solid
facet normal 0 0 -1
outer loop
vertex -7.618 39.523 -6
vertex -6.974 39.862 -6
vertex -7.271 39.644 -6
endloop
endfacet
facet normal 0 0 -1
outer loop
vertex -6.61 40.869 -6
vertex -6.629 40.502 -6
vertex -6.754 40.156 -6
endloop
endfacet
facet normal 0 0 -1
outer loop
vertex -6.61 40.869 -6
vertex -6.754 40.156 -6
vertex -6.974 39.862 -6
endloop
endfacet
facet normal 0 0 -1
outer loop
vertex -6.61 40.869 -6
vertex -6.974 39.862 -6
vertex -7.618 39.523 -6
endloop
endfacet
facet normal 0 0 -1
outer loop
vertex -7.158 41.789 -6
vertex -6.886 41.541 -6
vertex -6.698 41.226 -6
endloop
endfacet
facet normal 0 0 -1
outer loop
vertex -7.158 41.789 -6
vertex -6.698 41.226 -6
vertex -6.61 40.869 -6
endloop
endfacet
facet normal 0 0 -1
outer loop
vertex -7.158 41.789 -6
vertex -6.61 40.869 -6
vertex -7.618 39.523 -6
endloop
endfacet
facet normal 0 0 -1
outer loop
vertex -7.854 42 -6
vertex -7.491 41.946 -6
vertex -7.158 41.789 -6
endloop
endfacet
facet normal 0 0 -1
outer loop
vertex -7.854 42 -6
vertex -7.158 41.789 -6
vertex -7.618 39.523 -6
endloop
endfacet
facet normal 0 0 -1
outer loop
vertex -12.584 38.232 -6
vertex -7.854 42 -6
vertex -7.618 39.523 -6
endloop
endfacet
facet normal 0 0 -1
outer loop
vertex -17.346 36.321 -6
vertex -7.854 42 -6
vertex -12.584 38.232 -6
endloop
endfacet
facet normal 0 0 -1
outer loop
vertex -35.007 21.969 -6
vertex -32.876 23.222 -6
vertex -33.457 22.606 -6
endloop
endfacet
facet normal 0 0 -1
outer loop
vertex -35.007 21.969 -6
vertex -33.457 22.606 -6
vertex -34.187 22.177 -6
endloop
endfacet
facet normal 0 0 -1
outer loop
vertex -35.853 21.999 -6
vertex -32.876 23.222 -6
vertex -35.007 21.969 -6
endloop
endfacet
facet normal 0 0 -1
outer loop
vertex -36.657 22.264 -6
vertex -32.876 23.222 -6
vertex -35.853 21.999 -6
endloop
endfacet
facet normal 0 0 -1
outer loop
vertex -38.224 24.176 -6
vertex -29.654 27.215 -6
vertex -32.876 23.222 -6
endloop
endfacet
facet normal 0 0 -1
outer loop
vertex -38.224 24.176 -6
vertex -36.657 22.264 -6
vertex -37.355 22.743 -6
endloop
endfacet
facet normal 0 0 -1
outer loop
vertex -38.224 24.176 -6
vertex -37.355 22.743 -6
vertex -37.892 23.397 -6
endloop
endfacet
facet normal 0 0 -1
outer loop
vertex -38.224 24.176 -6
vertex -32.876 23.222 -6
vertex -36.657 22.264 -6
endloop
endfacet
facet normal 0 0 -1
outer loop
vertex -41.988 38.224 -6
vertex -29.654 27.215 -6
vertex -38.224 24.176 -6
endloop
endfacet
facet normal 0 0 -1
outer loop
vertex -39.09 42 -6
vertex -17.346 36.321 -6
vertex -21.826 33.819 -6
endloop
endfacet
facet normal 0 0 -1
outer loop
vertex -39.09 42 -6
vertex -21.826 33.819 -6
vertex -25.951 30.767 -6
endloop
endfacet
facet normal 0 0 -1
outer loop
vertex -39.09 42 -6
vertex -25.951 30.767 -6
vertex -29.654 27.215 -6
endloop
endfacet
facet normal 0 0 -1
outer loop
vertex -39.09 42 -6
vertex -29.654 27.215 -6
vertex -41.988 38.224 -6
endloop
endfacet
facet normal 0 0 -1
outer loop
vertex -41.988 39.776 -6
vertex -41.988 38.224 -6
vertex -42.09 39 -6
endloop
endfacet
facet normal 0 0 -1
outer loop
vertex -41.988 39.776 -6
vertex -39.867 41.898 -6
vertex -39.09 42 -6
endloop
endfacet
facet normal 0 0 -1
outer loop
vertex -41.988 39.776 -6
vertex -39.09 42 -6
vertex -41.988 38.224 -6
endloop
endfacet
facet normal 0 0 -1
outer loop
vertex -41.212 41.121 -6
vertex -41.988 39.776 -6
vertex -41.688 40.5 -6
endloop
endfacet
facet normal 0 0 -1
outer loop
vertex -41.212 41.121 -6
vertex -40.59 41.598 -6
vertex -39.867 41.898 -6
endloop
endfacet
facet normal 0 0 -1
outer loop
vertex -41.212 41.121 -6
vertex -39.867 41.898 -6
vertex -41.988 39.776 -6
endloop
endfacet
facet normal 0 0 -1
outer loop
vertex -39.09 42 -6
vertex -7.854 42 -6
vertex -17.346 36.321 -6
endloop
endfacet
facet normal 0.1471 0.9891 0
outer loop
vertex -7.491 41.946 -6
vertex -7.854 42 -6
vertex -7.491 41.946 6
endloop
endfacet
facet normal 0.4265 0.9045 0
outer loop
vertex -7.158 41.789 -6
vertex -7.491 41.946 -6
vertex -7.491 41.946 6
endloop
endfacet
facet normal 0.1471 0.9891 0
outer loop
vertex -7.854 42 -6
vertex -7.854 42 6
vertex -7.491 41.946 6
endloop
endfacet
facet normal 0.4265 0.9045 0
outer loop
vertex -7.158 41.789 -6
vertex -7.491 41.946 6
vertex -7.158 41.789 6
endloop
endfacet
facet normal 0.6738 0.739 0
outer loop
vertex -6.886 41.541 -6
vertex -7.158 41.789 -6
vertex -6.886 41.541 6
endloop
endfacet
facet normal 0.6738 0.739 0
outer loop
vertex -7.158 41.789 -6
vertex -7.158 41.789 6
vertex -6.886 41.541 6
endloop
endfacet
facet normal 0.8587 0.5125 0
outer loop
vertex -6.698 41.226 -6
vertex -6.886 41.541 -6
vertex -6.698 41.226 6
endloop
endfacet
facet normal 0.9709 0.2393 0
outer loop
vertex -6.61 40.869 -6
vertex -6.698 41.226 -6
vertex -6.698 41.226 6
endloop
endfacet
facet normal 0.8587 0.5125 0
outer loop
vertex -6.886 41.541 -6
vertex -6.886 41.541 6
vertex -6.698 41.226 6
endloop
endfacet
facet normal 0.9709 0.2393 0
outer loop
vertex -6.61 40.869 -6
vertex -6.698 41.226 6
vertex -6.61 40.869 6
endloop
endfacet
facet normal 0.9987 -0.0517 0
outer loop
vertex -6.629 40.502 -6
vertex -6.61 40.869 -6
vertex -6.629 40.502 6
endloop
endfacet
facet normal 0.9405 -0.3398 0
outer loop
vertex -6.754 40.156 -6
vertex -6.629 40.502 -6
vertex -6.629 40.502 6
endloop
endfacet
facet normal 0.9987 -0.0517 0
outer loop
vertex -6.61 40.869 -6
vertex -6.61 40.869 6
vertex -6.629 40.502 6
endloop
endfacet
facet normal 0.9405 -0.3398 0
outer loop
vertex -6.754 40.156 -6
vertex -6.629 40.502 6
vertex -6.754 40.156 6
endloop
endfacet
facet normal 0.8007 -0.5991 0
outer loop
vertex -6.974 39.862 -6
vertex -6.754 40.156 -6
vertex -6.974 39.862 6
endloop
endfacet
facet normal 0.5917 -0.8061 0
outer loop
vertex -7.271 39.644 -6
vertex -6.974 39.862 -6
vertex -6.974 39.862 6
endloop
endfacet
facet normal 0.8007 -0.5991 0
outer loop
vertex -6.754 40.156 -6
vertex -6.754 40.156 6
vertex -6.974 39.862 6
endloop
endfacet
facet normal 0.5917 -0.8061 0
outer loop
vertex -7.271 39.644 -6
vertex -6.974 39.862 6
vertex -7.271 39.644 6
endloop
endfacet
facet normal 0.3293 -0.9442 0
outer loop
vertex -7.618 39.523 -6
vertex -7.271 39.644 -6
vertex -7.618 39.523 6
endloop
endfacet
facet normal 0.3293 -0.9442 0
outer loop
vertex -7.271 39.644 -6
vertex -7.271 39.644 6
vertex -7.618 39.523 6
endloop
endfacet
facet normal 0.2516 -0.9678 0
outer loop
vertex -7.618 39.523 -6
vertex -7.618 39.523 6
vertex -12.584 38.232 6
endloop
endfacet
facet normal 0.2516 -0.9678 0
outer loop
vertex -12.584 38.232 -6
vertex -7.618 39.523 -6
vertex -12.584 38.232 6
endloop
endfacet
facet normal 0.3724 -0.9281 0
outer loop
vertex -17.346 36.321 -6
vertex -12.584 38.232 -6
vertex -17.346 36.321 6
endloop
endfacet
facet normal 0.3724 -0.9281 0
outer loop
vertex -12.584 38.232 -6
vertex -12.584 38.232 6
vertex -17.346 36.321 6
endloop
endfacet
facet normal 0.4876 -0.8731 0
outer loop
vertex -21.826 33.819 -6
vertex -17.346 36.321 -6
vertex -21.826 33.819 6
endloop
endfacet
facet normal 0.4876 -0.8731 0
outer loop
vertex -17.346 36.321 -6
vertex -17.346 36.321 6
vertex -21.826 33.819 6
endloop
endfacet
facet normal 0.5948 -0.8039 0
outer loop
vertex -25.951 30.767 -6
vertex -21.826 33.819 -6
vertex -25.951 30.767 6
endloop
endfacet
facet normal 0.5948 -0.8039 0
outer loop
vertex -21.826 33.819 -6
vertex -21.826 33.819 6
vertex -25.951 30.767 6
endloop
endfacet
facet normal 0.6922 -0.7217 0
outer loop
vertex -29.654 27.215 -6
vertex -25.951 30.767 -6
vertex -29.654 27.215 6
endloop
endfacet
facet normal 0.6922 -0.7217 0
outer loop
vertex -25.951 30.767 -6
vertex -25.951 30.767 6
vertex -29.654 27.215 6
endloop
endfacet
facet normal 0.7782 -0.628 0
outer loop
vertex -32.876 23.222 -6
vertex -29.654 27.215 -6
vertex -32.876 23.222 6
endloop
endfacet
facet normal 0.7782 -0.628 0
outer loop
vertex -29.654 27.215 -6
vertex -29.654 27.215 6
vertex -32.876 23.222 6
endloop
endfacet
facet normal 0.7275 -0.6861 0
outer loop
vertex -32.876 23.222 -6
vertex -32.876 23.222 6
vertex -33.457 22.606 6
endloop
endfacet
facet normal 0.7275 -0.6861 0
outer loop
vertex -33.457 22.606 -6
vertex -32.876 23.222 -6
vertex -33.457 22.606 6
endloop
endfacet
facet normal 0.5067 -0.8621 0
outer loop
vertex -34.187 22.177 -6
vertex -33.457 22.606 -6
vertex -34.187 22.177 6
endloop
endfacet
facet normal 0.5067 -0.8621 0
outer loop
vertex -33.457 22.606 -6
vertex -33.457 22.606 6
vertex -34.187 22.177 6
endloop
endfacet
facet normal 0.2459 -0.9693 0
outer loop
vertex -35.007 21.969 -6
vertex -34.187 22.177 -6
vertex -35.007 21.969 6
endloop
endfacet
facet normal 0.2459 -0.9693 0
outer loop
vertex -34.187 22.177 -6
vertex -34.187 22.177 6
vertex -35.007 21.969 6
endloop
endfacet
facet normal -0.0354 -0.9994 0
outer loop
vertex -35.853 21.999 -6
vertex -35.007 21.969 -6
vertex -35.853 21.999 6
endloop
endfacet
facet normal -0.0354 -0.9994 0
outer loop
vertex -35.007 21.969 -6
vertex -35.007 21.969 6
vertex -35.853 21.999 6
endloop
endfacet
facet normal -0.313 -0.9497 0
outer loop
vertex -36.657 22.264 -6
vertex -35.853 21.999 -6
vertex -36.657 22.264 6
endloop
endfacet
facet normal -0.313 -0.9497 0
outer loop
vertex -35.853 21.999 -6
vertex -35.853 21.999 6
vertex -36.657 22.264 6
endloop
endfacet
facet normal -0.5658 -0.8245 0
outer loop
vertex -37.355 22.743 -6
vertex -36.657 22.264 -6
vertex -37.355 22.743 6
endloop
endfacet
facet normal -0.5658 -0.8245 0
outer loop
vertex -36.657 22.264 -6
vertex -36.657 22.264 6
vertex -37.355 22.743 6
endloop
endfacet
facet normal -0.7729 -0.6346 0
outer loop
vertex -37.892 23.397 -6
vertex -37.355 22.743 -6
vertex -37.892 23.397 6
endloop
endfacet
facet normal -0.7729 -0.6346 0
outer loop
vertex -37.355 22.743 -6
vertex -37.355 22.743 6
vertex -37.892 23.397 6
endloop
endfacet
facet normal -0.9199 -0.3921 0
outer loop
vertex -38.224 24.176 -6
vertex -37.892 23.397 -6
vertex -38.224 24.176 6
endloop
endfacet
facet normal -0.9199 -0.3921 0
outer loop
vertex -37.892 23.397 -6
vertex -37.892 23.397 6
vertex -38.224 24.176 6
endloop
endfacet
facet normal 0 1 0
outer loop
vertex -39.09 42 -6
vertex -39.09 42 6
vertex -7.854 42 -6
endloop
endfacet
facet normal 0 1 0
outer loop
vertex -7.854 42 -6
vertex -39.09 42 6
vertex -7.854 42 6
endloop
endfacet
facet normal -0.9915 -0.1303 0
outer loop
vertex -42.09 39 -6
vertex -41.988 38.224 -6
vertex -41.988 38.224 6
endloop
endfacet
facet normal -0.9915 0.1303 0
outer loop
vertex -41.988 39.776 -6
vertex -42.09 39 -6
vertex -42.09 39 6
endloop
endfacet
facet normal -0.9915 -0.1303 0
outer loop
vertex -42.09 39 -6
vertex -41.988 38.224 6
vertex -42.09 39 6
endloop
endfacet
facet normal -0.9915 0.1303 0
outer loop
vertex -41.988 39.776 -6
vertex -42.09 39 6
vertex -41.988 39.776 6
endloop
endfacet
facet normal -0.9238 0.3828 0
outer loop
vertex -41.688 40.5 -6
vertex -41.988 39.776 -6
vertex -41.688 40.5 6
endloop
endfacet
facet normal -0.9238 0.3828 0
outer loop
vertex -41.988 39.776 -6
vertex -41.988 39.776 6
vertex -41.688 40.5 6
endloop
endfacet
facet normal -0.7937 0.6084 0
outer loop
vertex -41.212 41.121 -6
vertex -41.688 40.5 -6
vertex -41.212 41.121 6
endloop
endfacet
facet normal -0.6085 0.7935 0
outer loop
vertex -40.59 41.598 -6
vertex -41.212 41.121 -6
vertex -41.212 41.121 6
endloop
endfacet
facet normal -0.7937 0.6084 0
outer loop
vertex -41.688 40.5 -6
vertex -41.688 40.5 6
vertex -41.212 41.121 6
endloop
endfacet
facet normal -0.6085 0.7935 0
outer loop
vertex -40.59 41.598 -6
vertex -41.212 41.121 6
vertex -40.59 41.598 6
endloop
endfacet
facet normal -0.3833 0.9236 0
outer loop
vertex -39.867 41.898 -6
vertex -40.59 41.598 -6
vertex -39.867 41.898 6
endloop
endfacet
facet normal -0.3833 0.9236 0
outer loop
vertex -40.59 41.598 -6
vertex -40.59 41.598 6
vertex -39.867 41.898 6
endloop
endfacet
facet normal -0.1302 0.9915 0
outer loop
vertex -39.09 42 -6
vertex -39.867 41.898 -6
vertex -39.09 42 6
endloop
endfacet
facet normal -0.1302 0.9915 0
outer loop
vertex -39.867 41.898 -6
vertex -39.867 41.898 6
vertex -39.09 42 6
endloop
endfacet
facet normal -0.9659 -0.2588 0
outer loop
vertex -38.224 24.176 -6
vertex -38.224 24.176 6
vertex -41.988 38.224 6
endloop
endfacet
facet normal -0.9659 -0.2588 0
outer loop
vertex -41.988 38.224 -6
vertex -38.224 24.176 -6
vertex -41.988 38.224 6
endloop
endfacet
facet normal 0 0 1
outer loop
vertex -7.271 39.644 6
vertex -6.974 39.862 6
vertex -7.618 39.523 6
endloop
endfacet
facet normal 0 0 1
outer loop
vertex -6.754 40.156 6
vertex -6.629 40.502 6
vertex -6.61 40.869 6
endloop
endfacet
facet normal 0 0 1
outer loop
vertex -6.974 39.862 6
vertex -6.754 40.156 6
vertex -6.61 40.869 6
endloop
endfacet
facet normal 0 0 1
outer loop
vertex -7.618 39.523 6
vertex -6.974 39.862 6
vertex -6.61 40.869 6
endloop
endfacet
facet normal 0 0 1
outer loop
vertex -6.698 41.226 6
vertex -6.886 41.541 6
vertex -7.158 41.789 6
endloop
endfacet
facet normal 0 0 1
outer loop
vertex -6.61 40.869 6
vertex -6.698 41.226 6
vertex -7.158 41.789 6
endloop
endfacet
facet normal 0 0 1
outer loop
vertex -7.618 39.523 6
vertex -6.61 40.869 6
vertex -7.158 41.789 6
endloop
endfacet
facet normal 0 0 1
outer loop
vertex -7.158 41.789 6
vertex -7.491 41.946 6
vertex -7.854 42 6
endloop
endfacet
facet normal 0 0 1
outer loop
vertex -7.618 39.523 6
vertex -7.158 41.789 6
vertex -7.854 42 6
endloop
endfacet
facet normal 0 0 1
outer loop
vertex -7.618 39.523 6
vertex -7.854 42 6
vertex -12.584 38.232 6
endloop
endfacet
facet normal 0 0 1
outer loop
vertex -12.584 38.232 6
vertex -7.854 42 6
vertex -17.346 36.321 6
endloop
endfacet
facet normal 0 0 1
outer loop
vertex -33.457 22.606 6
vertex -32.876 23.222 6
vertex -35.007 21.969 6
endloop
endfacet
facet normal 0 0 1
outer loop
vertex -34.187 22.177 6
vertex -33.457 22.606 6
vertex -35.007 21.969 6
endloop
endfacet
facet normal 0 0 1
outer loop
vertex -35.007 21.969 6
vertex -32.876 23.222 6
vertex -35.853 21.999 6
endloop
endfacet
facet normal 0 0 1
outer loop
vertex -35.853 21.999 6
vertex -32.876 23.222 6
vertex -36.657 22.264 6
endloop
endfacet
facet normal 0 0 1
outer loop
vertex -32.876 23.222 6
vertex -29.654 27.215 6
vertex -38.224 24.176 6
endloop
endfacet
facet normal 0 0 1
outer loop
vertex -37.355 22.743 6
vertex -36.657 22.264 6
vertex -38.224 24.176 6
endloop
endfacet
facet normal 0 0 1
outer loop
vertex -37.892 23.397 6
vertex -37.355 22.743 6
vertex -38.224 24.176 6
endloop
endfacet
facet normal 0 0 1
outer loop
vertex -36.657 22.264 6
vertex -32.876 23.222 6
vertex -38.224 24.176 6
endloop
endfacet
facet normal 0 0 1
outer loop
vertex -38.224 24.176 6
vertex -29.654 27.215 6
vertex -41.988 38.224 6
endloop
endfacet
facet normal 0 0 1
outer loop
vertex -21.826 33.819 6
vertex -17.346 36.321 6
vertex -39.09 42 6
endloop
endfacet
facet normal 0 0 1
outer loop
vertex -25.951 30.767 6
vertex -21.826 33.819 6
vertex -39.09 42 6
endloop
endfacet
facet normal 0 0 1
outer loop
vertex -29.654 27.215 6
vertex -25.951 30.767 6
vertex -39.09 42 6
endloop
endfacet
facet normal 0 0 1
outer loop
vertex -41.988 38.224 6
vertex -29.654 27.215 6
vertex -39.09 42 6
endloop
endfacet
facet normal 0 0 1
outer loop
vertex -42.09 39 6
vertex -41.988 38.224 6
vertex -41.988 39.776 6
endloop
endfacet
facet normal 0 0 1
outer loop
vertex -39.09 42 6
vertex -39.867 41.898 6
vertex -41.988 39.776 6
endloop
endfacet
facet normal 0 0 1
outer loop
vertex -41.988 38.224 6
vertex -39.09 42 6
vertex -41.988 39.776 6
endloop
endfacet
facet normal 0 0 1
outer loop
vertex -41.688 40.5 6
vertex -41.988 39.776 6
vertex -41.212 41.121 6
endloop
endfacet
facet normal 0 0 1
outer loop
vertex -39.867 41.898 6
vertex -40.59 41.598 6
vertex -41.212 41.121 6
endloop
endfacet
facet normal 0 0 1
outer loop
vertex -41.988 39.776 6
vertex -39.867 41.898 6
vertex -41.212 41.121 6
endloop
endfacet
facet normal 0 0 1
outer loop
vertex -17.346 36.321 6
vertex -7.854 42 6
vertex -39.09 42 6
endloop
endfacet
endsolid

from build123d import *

# Parameters (mm, degrees)
EXTRUDE1_DEPTH = 6


with BuildPart() as part:
    # Sketch1 → Extrude1 (new body, symmetric)
    with BuildSketch(Plane.XY):
        with BuildLine():
            Line((-38.224035391, 24.175857425), (-41.98810136, 38.223542865))
            ThreePointArc((-41.98810136, 38.223542865), (-41.470383902, 40.826284287), (-39.090323881, 42))
            Line((-39.090323881, 42), (-7.854139036, 42))
            ThreePointArc((-7.854139036, 42), (-6.609799443, 40.868823297), (-7.617568583, 39.522590361))
            ThreePointArc((-7.617568583, 39.522590361), (-21.825698531, 33.818654373), (-32.875881641, 23.221518175))
            ThreePointArc((-32.875881641, 23.221518175), (-35.853261528, 21.99896609), (-38.224035391, 24.175857425))
        make_face()
    extrude(amount=EXTRUDE1_DEPTH, both=True)


solid = part.part
